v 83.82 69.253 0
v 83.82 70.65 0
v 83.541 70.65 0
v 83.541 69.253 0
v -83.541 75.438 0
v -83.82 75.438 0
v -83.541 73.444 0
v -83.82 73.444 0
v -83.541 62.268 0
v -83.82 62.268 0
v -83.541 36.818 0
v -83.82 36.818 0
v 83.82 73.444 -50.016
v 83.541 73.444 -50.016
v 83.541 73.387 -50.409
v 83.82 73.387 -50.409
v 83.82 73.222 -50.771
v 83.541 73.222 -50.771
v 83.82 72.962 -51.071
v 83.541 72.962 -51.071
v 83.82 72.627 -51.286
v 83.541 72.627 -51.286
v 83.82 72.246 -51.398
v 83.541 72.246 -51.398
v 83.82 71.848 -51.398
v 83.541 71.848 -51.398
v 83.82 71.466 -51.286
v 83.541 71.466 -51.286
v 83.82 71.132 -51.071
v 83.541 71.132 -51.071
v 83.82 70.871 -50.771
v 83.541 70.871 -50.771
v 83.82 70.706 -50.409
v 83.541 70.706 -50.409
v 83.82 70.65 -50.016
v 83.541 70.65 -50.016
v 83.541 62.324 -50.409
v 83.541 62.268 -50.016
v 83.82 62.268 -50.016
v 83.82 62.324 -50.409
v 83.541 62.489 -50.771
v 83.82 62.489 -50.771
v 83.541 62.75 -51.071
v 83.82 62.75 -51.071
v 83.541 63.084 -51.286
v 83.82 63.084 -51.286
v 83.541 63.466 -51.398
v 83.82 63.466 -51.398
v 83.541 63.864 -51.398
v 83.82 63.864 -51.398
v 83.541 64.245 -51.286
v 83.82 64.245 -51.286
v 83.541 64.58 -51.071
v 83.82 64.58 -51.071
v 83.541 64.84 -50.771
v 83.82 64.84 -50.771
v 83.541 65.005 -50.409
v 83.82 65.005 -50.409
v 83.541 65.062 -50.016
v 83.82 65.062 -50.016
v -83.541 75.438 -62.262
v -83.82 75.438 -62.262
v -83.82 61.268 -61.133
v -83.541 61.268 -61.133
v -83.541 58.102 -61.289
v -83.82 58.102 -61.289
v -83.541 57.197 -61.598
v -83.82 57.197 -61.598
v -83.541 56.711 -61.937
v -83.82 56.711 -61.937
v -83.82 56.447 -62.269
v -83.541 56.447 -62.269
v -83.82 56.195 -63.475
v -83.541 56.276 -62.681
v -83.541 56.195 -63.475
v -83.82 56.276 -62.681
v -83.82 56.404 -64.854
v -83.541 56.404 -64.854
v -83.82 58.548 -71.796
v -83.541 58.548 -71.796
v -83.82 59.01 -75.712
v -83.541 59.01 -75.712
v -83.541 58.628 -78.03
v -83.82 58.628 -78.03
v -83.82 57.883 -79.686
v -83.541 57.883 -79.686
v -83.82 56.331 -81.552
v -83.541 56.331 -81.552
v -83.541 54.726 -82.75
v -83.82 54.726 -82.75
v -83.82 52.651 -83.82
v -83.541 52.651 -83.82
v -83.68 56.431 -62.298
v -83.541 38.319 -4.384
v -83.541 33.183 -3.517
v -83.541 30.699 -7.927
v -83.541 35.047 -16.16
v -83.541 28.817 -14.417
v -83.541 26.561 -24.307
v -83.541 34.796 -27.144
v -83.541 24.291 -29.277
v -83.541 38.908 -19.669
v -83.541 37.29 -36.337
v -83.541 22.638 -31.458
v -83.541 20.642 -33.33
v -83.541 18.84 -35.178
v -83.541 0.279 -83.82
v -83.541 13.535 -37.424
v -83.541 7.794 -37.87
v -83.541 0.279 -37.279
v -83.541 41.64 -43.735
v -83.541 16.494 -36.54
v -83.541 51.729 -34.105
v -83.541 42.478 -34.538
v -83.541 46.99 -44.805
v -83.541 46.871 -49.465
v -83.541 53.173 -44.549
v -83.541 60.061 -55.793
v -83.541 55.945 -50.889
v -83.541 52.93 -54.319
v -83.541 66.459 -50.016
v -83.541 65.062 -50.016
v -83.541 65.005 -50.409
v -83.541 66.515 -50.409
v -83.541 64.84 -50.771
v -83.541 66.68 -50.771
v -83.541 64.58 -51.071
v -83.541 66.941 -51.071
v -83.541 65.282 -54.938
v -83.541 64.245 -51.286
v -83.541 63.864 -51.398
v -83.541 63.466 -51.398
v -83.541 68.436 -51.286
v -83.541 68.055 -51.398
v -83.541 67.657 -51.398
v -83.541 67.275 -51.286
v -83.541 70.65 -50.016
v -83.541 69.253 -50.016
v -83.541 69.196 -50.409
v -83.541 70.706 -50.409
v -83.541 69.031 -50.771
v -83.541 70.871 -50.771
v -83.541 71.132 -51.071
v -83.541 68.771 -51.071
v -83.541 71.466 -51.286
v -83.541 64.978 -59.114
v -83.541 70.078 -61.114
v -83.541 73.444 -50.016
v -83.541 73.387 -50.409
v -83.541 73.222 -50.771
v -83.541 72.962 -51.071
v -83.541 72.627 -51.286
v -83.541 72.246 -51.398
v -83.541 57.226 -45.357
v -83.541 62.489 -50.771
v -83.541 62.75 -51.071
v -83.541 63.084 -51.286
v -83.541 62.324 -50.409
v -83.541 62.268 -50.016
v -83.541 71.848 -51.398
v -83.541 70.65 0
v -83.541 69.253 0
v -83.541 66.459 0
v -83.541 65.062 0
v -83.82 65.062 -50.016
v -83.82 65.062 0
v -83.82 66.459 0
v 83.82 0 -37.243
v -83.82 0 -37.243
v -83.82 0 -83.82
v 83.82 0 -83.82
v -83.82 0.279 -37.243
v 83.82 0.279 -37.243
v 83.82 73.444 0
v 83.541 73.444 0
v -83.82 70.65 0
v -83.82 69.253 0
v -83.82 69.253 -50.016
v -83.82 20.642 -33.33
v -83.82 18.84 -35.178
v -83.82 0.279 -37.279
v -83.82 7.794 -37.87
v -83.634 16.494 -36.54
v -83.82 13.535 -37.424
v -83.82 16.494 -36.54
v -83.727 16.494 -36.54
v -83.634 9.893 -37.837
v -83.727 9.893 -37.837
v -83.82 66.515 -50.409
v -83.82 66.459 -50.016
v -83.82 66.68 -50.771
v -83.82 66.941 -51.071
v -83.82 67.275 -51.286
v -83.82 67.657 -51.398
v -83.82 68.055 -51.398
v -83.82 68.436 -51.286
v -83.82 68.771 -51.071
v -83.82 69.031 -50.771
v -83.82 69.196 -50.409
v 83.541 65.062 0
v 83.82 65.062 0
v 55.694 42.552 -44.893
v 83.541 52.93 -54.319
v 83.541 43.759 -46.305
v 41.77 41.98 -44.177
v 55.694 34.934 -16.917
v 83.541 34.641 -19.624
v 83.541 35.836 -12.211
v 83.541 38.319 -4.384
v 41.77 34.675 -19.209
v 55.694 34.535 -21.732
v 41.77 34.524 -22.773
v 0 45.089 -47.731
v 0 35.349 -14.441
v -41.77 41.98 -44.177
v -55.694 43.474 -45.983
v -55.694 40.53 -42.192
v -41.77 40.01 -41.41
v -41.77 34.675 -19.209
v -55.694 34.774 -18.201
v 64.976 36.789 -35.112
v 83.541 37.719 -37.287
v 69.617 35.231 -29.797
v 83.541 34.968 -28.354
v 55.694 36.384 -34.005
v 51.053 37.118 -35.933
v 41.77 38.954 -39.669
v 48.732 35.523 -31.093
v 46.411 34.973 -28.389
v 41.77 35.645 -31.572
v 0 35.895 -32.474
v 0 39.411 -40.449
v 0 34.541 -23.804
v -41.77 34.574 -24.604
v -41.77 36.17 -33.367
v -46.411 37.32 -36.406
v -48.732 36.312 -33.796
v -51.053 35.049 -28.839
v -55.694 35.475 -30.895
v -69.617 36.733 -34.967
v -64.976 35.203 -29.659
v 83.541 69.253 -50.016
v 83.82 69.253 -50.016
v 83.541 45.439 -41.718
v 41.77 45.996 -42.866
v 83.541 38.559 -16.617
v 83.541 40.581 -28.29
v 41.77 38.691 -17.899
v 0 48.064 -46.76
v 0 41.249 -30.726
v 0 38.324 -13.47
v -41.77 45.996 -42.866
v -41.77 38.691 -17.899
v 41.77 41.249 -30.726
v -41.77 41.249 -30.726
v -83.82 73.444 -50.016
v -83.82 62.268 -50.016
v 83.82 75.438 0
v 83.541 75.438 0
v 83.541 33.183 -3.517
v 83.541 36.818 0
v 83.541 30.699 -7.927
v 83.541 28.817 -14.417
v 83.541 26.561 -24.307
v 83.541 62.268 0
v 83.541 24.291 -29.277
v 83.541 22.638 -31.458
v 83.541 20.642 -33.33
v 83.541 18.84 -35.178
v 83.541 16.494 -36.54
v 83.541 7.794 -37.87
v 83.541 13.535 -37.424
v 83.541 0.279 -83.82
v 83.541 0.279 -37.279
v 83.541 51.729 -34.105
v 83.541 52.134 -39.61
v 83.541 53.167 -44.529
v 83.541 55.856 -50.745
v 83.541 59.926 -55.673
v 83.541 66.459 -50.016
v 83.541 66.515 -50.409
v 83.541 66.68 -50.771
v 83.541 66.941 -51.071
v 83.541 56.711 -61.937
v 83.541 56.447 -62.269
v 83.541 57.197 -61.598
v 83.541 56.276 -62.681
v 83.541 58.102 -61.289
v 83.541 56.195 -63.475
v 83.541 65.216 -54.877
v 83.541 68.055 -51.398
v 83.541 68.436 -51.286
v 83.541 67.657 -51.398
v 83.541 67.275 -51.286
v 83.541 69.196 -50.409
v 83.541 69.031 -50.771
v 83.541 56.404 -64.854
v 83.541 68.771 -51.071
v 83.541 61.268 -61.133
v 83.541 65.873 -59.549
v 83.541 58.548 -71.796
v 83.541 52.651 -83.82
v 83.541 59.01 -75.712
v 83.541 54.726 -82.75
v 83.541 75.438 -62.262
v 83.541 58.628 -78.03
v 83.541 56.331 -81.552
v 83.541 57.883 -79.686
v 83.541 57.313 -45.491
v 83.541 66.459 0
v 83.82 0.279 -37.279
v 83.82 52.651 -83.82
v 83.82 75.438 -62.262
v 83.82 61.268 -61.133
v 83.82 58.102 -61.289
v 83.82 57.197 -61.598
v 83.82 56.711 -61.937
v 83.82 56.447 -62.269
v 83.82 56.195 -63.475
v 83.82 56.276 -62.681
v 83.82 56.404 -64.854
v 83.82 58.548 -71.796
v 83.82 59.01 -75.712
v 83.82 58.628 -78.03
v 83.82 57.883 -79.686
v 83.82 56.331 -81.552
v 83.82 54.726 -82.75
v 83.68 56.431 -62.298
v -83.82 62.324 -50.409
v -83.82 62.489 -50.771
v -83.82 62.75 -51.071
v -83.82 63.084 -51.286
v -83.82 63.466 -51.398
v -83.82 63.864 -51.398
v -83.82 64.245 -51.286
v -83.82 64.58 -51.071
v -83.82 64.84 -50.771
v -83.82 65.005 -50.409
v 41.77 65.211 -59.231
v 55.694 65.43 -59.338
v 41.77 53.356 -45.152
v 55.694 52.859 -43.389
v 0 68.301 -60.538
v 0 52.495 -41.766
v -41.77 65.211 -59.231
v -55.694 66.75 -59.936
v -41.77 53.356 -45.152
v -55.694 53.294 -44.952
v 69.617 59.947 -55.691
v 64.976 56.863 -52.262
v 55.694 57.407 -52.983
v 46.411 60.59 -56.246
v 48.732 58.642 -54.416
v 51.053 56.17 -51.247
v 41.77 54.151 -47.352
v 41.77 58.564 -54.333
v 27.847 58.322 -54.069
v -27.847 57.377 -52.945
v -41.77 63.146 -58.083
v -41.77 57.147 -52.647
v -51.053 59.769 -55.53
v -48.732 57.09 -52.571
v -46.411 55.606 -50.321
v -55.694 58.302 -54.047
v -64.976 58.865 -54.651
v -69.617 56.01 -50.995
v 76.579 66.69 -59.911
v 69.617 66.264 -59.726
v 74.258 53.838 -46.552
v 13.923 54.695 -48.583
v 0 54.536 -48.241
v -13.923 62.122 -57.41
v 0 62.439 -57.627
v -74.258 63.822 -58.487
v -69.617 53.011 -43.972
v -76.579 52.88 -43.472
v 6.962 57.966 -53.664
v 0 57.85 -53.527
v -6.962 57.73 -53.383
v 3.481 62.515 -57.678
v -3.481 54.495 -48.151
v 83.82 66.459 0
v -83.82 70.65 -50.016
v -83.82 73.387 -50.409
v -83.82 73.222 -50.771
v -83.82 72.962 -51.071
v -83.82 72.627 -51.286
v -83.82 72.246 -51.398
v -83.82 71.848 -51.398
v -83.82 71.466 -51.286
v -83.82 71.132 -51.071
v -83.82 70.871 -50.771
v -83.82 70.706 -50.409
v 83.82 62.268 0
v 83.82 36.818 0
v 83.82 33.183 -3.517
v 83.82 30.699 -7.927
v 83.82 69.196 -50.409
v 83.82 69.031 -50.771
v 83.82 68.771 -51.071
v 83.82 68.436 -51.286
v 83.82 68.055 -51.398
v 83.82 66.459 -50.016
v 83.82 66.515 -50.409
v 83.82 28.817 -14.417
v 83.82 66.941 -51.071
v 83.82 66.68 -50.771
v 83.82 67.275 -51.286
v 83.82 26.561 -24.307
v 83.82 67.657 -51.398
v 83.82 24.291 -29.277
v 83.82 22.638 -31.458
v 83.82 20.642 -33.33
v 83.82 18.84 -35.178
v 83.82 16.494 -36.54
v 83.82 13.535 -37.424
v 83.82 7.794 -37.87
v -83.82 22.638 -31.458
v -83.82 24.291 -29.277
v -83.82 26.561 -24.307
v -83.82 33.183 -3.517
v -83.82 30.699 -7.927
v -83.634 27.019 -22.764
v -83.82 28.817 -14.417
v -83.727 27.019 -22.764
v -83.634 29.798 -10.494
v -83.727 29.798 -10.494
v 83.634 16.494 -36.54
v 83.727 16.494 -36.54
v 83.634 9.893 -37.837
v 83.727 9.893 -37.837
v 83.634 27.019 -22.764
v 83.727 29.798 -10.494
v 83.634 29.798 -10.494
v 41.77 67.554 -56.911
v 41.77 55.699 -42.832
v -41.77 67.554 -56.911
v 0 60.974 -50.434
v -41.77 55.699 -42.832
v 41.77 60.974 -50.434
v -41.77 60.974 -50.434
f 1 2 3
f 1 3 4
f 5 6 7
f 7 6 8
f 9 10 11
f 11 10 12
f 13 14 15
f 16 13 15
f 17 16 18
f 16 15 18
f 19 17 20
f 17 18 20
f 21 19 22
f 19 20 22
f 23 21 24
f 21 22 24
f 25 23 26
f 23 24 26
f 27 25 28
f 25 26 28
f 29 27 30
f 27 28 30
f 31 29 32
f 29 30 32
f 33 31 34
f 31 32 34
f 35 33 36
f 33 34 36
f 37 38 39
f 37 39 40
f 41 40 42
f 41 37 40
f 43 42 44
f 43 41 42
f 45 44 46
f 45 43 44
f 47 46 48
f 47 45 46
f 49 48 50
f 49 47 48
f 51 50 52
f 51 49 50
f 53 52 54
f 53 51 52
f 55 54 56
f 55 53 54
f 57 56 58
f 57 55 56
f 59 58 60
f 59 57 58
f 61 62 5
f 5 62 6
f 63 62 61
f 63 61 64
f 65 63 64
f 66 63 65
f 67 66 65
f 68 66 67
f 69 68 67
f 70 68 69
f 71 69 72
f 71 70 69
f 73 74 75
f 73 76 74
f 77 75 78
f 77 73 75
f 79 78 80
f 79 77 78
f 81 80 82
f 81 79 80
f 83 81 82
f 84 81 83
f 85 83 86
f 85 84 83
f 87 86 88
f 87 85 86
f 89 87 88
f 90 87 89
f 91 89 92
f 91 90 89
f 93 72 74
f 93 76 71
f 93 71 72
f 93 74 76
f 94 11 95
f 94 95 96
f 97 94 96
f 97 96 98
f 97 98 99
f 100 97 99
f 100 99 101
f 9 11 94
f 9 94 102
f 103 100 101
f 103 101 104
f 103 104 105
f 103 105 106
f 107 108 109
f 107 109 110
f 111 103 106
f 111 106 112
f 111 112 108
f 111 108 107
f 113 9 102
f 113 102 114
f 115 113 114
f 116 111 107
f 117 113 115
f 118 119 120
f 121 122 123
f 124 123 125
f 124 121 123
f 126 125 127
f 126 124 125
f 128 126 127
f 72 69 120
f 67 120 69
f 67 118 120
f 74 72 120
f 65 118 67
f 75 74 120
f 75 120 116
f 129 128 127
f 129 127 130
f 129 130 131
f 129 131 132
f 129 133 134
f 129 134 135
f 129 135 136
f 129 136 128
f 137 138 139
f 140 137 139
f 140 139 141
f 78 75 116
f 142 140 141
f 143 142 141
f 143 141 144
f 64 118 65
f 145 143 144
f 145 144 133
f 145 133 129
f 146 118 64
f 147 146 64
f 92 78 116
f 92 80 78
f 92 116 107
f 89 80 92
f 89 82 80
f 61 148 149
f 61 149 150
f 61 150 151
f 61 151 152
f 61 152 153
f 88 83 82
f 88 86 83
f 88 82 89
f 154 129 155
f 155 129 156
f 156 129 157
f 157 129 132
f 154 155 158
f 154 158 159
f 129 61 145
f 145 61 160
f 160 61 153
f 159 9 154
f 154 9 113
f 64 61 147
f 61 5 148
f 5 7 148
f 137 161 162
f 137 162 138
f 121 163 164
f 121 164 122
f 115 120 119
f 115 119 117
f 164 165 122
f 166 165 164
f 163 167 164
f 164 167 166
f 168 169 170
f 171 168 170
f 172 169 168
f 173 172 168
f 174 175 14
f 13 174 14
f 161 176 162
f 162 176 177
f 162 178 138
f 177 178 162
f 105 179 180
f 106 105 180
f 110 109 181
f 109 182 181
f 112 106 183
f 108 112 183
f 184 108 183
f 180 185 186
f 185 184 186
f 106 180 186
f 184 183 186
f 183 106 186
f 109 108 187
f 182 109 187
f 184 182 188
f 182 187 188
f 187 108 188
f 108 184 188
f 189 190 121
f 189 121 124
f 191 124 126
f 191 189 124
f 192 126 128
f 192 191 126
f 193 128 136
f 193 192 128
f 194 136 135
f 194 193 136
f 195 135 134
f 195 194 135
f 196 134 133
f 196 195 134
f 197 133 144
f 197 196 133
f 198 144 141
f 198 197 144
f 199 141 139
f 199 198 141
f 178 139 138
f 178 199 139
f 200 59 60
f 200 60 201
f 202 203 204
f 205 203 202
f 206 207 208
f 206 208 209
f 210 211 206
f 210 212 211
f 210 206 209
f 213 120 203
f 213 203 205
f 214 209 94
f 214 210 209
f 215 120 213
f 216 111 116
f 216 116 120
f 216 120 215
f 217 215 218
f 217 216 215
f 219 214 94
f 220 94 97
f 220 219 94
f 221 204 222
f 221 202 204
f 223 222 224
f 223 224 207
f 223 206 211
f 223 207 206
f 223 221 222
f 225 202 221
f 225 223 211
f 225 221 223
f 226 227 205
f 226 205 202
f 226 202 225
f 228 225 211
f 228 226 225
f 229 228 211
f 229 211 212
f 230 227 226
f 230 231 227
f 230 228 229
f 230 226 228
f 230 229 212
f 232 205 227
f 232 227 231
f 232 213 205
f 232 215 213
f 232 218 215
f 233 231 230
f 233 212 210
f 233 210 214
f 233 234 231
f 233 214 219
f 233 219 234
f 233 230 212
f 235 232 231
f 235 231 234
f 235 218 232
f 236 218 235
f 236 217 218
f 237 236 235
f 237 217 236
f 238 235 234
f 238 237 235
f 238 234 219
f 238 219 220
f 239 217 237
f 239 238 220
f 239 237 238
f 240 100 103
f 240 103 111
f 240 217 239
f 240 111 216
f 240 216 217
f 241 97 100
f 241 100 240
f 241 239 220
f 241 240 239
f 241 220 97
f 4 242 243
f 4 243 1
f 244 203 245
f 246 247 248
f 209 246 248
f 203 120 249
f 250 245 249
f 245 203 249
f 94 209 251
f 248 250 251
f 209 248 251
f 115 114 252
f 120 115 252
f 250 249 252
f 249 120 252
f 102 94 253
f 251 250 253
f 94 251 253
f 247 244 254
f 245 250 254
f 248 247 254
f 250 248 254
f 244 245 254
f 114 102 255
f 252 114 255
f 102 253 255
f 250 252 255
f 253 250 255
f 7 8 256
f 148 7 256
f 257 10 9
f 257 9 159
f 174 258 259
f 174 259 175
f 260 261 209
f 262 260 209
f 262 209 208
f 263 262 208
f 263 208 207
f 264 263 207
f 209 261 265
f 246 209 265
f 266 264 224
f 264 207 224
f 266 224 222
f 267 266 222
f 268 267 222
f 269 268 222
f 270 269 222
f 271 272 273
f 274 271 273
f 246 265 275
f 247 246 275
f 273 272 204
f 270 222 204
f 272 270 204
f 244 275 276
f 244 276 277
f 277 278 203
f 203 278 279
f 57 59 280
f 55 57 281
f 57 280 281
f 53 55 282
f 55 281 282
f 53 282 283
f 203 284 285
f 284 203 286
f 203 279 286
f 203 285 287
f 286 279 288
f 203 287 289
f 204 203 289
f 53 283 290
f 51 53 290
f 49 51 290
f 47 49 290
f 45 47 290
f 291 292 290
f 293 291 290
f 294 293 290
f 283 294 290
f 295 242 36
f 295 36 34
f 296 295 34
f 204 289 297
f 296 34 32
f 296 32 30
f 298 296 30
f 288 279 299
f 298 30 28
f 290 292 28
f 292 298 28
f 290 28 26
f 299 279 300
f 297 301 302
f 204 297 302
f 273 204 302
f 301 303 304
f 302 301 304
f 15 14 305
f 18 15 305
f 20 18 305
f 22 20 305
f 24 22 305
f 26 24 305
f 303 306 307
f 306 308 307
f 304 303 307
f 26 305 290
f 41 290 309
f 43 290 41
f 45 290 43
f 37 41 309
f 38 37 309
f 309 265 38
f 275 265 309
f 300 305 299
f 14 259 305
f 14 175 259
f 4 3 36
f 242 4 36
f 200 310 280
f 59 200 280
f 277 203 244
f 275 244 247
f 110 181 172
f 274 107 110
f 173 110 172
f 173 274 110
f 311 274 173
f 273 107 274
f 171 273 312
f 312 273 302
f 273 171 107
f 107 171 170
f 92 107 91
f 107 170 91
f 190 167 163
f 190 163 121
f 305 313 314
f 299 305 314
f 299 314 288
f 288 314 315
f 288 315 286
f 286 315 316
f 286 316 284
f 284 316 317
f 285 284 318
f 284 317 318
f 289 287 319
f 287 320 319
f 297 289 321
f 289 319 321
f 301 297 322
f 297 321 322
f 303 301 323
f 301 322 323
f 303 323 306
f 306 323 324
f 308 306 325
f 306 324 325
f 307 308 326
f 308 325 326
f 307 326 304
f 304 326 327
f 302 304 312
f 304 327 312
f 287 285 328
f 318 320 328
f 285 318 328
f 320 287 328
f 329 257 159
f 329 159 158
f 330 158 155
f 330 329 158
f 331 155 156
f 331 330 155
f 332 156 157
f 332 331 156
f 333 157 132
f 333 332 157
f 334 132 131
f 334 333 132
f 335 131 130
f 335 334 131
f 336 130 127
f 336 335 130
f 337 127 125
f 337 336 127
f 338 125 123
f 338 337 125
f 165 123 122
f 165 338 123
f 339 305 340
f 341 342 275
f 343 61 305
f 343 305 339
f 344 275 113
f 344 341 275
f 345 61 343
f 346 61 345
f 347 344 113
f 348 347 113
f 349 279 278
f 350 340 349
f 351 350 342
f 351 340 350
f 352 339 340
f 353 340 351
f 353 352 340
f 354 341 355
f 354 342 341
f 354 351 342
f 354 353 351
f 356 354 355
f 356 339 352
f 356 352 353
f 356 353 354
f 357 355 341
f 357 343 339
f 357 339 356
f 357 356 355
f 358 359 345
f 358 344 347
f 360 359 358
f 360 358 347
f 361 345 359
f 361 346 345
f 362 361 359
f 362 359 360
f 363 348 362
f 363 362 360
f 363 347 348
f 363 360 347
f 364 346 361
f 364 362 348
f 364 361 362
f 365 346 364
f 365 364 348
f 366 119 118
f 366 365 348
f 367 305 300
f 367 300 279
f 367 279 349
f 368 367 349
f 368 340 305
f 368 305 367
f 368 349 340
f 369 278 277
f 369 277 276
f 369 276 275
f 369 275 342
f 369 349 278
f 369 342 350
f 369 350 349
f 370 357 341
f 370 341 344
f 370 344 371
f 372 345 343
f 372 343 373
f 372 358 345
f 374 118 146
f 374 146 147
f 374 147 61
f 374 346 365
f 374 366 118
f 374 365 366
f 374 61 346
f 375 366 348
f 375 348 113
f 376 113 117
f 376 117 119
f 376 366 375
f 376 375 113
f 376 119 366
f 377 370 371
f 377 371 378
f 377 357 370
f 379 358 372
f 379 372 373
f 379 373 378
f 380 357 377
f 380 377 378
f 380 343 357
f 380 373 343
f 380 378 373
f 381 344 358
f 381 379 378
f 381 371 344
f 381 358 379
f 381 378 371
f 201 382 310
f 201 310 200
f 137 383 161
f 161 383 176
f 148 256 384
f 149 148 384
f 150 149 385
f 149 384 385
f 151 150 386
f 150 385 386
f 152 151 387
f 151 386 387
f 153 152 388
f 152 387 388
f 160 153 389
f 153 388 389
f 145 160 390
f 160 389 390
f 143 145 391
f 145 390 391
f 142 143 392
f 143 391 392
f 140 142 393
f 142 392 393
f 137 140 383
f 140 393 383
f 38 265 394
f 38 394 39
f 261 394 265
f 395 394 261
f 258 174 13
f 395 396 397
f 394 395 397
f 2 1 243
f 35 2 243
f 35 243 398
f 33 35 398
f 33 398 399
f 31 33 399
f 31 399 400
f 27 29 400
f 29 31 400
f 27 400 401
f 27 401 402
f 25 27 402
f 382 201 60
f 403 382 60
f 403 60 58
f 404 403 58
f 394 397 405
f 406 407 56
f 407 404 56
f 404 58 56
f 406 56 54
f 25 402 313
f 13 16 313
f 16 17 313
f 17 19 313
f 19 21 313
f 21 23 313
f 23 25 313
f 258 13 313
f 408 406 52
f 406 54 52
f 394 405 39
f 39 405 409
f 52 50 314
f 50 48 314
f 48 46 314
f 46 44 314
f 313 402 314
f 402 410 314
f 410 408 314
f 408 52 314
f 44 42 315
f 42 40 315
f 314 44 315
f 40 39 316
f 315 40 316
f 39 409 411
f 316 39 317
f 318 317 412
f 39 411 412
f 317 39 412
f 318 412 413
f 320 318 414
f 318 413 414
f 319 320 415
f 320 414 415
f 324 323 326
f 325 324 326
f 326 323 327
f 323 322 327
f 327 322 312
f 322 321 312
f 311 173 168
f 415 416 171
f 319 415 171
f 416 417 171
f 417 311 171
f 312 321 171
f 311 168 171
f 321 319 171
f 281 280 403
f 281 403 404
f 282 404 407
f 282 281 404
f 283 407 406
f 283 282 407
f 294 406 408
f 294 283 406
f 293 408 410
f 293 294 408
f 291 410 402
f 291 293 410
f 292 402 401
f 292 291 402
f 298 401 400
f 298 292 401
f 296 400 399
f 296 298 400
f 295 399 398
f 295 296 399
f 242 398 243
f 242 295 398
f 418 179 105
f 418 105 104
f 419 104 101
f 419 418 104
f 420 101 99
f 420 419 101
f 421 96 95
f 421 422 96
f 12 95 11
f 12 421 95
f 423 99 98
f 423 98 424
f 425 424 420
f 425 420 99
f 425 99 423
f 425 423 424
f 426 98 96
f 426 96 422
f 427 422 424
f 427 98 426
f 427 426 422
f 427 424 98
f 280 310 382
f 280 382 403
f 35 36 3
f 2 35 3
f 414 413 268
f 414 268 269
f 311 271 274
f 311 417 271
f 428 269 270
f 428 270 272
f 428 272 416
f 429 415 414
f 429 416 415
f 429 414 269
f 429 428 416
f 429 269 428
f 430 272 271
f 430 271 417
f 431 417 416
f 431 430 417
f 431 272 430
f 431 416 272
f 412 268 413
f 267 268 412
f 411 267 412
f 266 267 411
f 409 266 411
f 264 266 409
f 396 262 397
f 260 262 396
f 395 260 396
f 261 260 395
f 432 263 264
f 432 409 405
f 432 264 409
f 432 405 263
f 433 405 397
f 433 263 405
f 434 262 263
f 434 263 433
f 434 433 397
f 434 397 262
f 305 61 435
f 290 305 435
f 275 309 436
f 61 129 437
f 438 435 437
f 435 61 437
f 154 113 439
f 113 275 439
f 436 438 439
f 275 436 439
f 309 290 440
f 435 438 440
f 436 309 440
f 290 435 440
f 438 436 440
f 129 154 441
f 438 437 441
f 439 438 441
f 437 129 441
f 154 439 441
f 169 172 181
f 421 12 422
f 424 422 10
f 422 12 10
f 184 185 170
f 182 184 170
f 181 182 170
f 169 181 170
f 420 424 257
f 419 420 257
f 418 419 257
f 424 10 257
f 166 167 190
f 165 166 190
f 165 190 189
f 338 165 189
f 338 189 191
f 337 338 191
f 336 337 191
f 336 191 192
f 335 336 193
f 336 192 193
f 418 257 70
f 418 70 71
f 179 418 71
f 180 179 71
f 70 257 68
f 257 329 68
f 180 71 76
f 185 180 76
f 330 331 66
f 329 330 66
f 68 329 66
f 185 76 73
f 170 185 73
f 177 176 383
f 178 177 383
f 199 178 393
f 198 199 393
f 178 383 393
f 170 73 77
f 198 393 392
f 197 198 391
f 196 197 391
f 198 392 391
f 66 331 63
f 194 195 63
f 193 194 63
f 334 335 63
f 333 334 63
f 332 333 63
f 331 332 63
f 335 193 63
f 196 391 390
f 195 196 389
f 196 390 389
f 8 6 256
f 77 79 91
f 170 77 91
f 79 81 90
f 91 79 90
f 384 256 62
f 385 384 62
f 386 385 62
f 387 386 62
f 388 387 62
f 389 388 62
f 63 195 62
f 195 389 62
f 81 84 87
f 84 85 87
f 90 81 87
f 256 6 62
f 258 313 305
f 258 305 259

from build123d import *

# Parameters (mm, degrees)
BOSS_EXTRUDE1_START        = 762
BOSS_EXTRUDE1_DEPTH        = 2.54
BOSS_EXTRUDE3_DEPTH        = 759.46
BOSS_EXTRUDE3_DEPTH_BACK   = 762
BOSS_EXTRUDE3_2_DEPTH      = 759.46
BOSS_EXTRUDE3_2_DEPTH_BACK = 762
SKETCH13_W                 = 1524
SKETCH13_H                 = 423.429853573
BOSS_EXTRUDE4_DEPTH        = 2.54
CUT_EXTRUDE1_DEPTH         = 1278.344761778
CUT_EXTRUDE1_DEPTH_BACK    = 1278.344761778
CUT_EXTRUDE2_DEPTH         = 1278.344761778
CUT_EXTRUDE2_DEPTH_BACK    = 1278.344761778
SCALE1_SCALE               = 0.11


with BuildPart() as part:
    # Sketch3 → Boss-Extrude1 (new body)
    with BuildSketch(Plane(origin=(0, 0, 0), x_dir=(0, 0, -1), z_dir=(1, 0, 0)).offset(BOSS_EXTRUDE1_START)):
        with BuildLine():
            Line((338.570146427, 0), (762, 0))
            Line((762, 0), (762, 478.643823899))
            add(Edge.make_bspline(
                [(566.02119263, 685.8), (566.02119263, 609.562833411), (511.018643959, 418.064816879), (711.566045078, 596.214023542), (762, 478.643823899)],
                knots=[0, 0, 0, 0, 0.43337684, 1, 1, 1, 1], degree=3))
            Line((566.02119263, 685.8), (0, 685.8))
            Line((0, 685.8), (0, 216.97447871))
            add(Edge.make_bspline(
                [(0, 216.97447871), (268.153594246, 216.97447871), (370.795901917, 243.07894269), (338.570146427, 0)],
                knots=[0, 0, 0, 0, 1, 1, 1, 1], degree=3))
        make_face()
    extrude(amount=-BOSS_EXTRUDE1_DEPTH)


with BuildPart() as body_2:
    # Mirror1: mirrored copy
    add(part.part.mirror(Plane(origin=(0, 0, 0), x_dir=(0, 0, 1), z_dir=(1, 0, 0))))


with BuildPart() as body_3:
    # Sketch8 → Boss-Extrude3 (new, two sides: drawn at the far end of the back side and taken through both)
    with BuildSketch(Plane(origin=(0, 0, 0), x_dir=(0, 0, -1), z_dir=(1, 0, 0)).offset(-BOSS_EXTRUDE3_DEPTH_BACK)):
        with BuildLine():
            add(Edge.make_bspline(
                [(566.02119263, 685.8), (478.94605907, 530.59259106), (310.041791286, 470.260887435)],
                knots=[0, 0, 0, 1, 1, 1], degree=2))
            add(Edge.make_bspline(
                [(566.02119263, 685.8), (535.192963113, 473.791997419), (310.041791286, 470.260887435)],
                knots=[0, 0, 0, 1, 1, 1], degree=2))
        make_face()
    extrude(amount=BOSS_EXTRUDE3_DEPTH + BOSS_EXTRUDE3_DEPTH_BACK)


with BuildPart() as body_4:
    # Sketch8 → Boss-Extrude3 2 (new, two sides: drawn at the far end of the back side and taken through both)
    with BuildSketch(Plane(origin=(0, 0, 0), x_dir=(0, 0, -1), z_dir=(1, 0, 0)).offset(-BOSS_EXTRUDE3_2_DEPTH_BACK)):
        with BuildLine():
            add(Edge.make_bspline(
                [(493.805357443, 481.17753493), (291.820165627, 335.217986135), (39.854765798, 348.358323747)],
                knots=[0, 0, 0, 1, 1, 1], degree=2))
            add(Edge.make_bspline(
                [(493.805357443, 481.17753493), (323.598432885, 237.863082713), (39.854765798, 348.358323747)],
                knots=[0, 0, 0, 1, 1, 1], degree=2))
        make_face()
    extrude(amount=BOSS_EXTRUDE3_2_DEPTH + BOSS_EXTRUDE3_2_DEPTH_BACK)


with BuildPart() as part_1:
    add(part.part)

    add(body_2.part)  # Boss-Extrude4 merges body 2
    # Sketch13 → Boss-Extrude4 (add)
    with BuildSketch(Plane(origin=(0, 0, 0), x_dir=(1, 0, 0), z_dir=(0, 1, 0))):
        with Locations((0, 550.285073214)):
            Rectangle(SKETCH13_W, SKETCH13_H)
    extrude(amount=BOSS_EXTRUDE4_DEPTH)

    # Sketch16 → Cut-Extrude1 (cut, two sides: drawn at the far end of the back side and taken through both)
    with BuildSketch(Plane(origin=(0, 0, 0), x_dir=(0, 0, -1), z_dir=(1, 0, 0)).offset(-CUT_EXTRUDE1_DEPTH_BACK)):
        with BuildLine():
            Line((0, 667.670249742), (454.687424311, 667.670249742))
            ThreePointArc((454.687424311, 667.670249742), (467.387424311, 654.970249742), (454.687424311, 642.270249742))
            Line((454.687424311, 642.270249742), (0, 642.270249742))
            ThreePointArc((0, 642.270249742), (-12.7, 654.970249742), (0, 667.670249742))
        make_face()
        with BuildLine():
            Line((0, 604.170249742), (454.687424311, 604.170249742))
            ThreePointArc((454.687424311, 604.170249742), (467.387424311, 616.870249742), (454.687424311, 629.570249742))
            Line((454.687424311, 629.570249742), (0, 629.570249742))
            ThreePointArc((0, 629.570249742), (-12.7, 616.870249742), (0, 604.170249742))
        make_face()
        with BuildLine():
            Line((0, 566.070249742), (454.687424311, 566.070249742))
            ThreePointArc((454.687424311, 566.070249742), (467.387424311, 578.770249742), (454.687424311, 591.470249742))
            Line((454.687424311, 591.470249742), (0, 591.470249742))
            ThreePointArc((0, 591.470249742), (-12.7, 578.770249742), (0, 566.070249742))
        make_face()
    extrude(amount=CUT_EXTRUDE1_DEPTH + CUT_EXTRUDE1_DEPTH_BACK, mode=Mode.SUBTRACT)

    # Sketch17 → Cut-Extrude2 (cut, two sides: drawn at the far end of the back side and taken through both)
    with BuildSketch(Plane(origin=(0, 0, 0), x_dir=(0, 0, -1), z_dir=(1, 0, 0)).offset(-CUT_EXTRUDE2_DEPTH_BACK)):
        with BuildLine():
            Line((0, 334.71225841), (0, 103.643051311))
            Line((0, 103.643051311), (302.999558796, 187.654799067))
            add(Edge.make_bspline(
                [(302.999558796, 187.654799067), (225.21849282, 285.739628908), (76.800772912, 227.85117527), (0, 334.71225841)],
                knots=[0, 0, 0, 0, 1, 1, 1, 1], degree=3))
        make_face()
    extrude(amount=CUT_EXTRUDE2_DEPTH + CUT_EXTRUDE2_DEPTH_BACK, mode=Mode.SUBTRACT)

    # Combine1: union body 4, body 3
    add(body_4.part)
    add(body_3.part)


with BuildPart() as part_2:
    # Scale1: scaled about (0, 0, 0)
    add(part_1.part.scale(SCALE1_SCALE))


solid = part_2.part
